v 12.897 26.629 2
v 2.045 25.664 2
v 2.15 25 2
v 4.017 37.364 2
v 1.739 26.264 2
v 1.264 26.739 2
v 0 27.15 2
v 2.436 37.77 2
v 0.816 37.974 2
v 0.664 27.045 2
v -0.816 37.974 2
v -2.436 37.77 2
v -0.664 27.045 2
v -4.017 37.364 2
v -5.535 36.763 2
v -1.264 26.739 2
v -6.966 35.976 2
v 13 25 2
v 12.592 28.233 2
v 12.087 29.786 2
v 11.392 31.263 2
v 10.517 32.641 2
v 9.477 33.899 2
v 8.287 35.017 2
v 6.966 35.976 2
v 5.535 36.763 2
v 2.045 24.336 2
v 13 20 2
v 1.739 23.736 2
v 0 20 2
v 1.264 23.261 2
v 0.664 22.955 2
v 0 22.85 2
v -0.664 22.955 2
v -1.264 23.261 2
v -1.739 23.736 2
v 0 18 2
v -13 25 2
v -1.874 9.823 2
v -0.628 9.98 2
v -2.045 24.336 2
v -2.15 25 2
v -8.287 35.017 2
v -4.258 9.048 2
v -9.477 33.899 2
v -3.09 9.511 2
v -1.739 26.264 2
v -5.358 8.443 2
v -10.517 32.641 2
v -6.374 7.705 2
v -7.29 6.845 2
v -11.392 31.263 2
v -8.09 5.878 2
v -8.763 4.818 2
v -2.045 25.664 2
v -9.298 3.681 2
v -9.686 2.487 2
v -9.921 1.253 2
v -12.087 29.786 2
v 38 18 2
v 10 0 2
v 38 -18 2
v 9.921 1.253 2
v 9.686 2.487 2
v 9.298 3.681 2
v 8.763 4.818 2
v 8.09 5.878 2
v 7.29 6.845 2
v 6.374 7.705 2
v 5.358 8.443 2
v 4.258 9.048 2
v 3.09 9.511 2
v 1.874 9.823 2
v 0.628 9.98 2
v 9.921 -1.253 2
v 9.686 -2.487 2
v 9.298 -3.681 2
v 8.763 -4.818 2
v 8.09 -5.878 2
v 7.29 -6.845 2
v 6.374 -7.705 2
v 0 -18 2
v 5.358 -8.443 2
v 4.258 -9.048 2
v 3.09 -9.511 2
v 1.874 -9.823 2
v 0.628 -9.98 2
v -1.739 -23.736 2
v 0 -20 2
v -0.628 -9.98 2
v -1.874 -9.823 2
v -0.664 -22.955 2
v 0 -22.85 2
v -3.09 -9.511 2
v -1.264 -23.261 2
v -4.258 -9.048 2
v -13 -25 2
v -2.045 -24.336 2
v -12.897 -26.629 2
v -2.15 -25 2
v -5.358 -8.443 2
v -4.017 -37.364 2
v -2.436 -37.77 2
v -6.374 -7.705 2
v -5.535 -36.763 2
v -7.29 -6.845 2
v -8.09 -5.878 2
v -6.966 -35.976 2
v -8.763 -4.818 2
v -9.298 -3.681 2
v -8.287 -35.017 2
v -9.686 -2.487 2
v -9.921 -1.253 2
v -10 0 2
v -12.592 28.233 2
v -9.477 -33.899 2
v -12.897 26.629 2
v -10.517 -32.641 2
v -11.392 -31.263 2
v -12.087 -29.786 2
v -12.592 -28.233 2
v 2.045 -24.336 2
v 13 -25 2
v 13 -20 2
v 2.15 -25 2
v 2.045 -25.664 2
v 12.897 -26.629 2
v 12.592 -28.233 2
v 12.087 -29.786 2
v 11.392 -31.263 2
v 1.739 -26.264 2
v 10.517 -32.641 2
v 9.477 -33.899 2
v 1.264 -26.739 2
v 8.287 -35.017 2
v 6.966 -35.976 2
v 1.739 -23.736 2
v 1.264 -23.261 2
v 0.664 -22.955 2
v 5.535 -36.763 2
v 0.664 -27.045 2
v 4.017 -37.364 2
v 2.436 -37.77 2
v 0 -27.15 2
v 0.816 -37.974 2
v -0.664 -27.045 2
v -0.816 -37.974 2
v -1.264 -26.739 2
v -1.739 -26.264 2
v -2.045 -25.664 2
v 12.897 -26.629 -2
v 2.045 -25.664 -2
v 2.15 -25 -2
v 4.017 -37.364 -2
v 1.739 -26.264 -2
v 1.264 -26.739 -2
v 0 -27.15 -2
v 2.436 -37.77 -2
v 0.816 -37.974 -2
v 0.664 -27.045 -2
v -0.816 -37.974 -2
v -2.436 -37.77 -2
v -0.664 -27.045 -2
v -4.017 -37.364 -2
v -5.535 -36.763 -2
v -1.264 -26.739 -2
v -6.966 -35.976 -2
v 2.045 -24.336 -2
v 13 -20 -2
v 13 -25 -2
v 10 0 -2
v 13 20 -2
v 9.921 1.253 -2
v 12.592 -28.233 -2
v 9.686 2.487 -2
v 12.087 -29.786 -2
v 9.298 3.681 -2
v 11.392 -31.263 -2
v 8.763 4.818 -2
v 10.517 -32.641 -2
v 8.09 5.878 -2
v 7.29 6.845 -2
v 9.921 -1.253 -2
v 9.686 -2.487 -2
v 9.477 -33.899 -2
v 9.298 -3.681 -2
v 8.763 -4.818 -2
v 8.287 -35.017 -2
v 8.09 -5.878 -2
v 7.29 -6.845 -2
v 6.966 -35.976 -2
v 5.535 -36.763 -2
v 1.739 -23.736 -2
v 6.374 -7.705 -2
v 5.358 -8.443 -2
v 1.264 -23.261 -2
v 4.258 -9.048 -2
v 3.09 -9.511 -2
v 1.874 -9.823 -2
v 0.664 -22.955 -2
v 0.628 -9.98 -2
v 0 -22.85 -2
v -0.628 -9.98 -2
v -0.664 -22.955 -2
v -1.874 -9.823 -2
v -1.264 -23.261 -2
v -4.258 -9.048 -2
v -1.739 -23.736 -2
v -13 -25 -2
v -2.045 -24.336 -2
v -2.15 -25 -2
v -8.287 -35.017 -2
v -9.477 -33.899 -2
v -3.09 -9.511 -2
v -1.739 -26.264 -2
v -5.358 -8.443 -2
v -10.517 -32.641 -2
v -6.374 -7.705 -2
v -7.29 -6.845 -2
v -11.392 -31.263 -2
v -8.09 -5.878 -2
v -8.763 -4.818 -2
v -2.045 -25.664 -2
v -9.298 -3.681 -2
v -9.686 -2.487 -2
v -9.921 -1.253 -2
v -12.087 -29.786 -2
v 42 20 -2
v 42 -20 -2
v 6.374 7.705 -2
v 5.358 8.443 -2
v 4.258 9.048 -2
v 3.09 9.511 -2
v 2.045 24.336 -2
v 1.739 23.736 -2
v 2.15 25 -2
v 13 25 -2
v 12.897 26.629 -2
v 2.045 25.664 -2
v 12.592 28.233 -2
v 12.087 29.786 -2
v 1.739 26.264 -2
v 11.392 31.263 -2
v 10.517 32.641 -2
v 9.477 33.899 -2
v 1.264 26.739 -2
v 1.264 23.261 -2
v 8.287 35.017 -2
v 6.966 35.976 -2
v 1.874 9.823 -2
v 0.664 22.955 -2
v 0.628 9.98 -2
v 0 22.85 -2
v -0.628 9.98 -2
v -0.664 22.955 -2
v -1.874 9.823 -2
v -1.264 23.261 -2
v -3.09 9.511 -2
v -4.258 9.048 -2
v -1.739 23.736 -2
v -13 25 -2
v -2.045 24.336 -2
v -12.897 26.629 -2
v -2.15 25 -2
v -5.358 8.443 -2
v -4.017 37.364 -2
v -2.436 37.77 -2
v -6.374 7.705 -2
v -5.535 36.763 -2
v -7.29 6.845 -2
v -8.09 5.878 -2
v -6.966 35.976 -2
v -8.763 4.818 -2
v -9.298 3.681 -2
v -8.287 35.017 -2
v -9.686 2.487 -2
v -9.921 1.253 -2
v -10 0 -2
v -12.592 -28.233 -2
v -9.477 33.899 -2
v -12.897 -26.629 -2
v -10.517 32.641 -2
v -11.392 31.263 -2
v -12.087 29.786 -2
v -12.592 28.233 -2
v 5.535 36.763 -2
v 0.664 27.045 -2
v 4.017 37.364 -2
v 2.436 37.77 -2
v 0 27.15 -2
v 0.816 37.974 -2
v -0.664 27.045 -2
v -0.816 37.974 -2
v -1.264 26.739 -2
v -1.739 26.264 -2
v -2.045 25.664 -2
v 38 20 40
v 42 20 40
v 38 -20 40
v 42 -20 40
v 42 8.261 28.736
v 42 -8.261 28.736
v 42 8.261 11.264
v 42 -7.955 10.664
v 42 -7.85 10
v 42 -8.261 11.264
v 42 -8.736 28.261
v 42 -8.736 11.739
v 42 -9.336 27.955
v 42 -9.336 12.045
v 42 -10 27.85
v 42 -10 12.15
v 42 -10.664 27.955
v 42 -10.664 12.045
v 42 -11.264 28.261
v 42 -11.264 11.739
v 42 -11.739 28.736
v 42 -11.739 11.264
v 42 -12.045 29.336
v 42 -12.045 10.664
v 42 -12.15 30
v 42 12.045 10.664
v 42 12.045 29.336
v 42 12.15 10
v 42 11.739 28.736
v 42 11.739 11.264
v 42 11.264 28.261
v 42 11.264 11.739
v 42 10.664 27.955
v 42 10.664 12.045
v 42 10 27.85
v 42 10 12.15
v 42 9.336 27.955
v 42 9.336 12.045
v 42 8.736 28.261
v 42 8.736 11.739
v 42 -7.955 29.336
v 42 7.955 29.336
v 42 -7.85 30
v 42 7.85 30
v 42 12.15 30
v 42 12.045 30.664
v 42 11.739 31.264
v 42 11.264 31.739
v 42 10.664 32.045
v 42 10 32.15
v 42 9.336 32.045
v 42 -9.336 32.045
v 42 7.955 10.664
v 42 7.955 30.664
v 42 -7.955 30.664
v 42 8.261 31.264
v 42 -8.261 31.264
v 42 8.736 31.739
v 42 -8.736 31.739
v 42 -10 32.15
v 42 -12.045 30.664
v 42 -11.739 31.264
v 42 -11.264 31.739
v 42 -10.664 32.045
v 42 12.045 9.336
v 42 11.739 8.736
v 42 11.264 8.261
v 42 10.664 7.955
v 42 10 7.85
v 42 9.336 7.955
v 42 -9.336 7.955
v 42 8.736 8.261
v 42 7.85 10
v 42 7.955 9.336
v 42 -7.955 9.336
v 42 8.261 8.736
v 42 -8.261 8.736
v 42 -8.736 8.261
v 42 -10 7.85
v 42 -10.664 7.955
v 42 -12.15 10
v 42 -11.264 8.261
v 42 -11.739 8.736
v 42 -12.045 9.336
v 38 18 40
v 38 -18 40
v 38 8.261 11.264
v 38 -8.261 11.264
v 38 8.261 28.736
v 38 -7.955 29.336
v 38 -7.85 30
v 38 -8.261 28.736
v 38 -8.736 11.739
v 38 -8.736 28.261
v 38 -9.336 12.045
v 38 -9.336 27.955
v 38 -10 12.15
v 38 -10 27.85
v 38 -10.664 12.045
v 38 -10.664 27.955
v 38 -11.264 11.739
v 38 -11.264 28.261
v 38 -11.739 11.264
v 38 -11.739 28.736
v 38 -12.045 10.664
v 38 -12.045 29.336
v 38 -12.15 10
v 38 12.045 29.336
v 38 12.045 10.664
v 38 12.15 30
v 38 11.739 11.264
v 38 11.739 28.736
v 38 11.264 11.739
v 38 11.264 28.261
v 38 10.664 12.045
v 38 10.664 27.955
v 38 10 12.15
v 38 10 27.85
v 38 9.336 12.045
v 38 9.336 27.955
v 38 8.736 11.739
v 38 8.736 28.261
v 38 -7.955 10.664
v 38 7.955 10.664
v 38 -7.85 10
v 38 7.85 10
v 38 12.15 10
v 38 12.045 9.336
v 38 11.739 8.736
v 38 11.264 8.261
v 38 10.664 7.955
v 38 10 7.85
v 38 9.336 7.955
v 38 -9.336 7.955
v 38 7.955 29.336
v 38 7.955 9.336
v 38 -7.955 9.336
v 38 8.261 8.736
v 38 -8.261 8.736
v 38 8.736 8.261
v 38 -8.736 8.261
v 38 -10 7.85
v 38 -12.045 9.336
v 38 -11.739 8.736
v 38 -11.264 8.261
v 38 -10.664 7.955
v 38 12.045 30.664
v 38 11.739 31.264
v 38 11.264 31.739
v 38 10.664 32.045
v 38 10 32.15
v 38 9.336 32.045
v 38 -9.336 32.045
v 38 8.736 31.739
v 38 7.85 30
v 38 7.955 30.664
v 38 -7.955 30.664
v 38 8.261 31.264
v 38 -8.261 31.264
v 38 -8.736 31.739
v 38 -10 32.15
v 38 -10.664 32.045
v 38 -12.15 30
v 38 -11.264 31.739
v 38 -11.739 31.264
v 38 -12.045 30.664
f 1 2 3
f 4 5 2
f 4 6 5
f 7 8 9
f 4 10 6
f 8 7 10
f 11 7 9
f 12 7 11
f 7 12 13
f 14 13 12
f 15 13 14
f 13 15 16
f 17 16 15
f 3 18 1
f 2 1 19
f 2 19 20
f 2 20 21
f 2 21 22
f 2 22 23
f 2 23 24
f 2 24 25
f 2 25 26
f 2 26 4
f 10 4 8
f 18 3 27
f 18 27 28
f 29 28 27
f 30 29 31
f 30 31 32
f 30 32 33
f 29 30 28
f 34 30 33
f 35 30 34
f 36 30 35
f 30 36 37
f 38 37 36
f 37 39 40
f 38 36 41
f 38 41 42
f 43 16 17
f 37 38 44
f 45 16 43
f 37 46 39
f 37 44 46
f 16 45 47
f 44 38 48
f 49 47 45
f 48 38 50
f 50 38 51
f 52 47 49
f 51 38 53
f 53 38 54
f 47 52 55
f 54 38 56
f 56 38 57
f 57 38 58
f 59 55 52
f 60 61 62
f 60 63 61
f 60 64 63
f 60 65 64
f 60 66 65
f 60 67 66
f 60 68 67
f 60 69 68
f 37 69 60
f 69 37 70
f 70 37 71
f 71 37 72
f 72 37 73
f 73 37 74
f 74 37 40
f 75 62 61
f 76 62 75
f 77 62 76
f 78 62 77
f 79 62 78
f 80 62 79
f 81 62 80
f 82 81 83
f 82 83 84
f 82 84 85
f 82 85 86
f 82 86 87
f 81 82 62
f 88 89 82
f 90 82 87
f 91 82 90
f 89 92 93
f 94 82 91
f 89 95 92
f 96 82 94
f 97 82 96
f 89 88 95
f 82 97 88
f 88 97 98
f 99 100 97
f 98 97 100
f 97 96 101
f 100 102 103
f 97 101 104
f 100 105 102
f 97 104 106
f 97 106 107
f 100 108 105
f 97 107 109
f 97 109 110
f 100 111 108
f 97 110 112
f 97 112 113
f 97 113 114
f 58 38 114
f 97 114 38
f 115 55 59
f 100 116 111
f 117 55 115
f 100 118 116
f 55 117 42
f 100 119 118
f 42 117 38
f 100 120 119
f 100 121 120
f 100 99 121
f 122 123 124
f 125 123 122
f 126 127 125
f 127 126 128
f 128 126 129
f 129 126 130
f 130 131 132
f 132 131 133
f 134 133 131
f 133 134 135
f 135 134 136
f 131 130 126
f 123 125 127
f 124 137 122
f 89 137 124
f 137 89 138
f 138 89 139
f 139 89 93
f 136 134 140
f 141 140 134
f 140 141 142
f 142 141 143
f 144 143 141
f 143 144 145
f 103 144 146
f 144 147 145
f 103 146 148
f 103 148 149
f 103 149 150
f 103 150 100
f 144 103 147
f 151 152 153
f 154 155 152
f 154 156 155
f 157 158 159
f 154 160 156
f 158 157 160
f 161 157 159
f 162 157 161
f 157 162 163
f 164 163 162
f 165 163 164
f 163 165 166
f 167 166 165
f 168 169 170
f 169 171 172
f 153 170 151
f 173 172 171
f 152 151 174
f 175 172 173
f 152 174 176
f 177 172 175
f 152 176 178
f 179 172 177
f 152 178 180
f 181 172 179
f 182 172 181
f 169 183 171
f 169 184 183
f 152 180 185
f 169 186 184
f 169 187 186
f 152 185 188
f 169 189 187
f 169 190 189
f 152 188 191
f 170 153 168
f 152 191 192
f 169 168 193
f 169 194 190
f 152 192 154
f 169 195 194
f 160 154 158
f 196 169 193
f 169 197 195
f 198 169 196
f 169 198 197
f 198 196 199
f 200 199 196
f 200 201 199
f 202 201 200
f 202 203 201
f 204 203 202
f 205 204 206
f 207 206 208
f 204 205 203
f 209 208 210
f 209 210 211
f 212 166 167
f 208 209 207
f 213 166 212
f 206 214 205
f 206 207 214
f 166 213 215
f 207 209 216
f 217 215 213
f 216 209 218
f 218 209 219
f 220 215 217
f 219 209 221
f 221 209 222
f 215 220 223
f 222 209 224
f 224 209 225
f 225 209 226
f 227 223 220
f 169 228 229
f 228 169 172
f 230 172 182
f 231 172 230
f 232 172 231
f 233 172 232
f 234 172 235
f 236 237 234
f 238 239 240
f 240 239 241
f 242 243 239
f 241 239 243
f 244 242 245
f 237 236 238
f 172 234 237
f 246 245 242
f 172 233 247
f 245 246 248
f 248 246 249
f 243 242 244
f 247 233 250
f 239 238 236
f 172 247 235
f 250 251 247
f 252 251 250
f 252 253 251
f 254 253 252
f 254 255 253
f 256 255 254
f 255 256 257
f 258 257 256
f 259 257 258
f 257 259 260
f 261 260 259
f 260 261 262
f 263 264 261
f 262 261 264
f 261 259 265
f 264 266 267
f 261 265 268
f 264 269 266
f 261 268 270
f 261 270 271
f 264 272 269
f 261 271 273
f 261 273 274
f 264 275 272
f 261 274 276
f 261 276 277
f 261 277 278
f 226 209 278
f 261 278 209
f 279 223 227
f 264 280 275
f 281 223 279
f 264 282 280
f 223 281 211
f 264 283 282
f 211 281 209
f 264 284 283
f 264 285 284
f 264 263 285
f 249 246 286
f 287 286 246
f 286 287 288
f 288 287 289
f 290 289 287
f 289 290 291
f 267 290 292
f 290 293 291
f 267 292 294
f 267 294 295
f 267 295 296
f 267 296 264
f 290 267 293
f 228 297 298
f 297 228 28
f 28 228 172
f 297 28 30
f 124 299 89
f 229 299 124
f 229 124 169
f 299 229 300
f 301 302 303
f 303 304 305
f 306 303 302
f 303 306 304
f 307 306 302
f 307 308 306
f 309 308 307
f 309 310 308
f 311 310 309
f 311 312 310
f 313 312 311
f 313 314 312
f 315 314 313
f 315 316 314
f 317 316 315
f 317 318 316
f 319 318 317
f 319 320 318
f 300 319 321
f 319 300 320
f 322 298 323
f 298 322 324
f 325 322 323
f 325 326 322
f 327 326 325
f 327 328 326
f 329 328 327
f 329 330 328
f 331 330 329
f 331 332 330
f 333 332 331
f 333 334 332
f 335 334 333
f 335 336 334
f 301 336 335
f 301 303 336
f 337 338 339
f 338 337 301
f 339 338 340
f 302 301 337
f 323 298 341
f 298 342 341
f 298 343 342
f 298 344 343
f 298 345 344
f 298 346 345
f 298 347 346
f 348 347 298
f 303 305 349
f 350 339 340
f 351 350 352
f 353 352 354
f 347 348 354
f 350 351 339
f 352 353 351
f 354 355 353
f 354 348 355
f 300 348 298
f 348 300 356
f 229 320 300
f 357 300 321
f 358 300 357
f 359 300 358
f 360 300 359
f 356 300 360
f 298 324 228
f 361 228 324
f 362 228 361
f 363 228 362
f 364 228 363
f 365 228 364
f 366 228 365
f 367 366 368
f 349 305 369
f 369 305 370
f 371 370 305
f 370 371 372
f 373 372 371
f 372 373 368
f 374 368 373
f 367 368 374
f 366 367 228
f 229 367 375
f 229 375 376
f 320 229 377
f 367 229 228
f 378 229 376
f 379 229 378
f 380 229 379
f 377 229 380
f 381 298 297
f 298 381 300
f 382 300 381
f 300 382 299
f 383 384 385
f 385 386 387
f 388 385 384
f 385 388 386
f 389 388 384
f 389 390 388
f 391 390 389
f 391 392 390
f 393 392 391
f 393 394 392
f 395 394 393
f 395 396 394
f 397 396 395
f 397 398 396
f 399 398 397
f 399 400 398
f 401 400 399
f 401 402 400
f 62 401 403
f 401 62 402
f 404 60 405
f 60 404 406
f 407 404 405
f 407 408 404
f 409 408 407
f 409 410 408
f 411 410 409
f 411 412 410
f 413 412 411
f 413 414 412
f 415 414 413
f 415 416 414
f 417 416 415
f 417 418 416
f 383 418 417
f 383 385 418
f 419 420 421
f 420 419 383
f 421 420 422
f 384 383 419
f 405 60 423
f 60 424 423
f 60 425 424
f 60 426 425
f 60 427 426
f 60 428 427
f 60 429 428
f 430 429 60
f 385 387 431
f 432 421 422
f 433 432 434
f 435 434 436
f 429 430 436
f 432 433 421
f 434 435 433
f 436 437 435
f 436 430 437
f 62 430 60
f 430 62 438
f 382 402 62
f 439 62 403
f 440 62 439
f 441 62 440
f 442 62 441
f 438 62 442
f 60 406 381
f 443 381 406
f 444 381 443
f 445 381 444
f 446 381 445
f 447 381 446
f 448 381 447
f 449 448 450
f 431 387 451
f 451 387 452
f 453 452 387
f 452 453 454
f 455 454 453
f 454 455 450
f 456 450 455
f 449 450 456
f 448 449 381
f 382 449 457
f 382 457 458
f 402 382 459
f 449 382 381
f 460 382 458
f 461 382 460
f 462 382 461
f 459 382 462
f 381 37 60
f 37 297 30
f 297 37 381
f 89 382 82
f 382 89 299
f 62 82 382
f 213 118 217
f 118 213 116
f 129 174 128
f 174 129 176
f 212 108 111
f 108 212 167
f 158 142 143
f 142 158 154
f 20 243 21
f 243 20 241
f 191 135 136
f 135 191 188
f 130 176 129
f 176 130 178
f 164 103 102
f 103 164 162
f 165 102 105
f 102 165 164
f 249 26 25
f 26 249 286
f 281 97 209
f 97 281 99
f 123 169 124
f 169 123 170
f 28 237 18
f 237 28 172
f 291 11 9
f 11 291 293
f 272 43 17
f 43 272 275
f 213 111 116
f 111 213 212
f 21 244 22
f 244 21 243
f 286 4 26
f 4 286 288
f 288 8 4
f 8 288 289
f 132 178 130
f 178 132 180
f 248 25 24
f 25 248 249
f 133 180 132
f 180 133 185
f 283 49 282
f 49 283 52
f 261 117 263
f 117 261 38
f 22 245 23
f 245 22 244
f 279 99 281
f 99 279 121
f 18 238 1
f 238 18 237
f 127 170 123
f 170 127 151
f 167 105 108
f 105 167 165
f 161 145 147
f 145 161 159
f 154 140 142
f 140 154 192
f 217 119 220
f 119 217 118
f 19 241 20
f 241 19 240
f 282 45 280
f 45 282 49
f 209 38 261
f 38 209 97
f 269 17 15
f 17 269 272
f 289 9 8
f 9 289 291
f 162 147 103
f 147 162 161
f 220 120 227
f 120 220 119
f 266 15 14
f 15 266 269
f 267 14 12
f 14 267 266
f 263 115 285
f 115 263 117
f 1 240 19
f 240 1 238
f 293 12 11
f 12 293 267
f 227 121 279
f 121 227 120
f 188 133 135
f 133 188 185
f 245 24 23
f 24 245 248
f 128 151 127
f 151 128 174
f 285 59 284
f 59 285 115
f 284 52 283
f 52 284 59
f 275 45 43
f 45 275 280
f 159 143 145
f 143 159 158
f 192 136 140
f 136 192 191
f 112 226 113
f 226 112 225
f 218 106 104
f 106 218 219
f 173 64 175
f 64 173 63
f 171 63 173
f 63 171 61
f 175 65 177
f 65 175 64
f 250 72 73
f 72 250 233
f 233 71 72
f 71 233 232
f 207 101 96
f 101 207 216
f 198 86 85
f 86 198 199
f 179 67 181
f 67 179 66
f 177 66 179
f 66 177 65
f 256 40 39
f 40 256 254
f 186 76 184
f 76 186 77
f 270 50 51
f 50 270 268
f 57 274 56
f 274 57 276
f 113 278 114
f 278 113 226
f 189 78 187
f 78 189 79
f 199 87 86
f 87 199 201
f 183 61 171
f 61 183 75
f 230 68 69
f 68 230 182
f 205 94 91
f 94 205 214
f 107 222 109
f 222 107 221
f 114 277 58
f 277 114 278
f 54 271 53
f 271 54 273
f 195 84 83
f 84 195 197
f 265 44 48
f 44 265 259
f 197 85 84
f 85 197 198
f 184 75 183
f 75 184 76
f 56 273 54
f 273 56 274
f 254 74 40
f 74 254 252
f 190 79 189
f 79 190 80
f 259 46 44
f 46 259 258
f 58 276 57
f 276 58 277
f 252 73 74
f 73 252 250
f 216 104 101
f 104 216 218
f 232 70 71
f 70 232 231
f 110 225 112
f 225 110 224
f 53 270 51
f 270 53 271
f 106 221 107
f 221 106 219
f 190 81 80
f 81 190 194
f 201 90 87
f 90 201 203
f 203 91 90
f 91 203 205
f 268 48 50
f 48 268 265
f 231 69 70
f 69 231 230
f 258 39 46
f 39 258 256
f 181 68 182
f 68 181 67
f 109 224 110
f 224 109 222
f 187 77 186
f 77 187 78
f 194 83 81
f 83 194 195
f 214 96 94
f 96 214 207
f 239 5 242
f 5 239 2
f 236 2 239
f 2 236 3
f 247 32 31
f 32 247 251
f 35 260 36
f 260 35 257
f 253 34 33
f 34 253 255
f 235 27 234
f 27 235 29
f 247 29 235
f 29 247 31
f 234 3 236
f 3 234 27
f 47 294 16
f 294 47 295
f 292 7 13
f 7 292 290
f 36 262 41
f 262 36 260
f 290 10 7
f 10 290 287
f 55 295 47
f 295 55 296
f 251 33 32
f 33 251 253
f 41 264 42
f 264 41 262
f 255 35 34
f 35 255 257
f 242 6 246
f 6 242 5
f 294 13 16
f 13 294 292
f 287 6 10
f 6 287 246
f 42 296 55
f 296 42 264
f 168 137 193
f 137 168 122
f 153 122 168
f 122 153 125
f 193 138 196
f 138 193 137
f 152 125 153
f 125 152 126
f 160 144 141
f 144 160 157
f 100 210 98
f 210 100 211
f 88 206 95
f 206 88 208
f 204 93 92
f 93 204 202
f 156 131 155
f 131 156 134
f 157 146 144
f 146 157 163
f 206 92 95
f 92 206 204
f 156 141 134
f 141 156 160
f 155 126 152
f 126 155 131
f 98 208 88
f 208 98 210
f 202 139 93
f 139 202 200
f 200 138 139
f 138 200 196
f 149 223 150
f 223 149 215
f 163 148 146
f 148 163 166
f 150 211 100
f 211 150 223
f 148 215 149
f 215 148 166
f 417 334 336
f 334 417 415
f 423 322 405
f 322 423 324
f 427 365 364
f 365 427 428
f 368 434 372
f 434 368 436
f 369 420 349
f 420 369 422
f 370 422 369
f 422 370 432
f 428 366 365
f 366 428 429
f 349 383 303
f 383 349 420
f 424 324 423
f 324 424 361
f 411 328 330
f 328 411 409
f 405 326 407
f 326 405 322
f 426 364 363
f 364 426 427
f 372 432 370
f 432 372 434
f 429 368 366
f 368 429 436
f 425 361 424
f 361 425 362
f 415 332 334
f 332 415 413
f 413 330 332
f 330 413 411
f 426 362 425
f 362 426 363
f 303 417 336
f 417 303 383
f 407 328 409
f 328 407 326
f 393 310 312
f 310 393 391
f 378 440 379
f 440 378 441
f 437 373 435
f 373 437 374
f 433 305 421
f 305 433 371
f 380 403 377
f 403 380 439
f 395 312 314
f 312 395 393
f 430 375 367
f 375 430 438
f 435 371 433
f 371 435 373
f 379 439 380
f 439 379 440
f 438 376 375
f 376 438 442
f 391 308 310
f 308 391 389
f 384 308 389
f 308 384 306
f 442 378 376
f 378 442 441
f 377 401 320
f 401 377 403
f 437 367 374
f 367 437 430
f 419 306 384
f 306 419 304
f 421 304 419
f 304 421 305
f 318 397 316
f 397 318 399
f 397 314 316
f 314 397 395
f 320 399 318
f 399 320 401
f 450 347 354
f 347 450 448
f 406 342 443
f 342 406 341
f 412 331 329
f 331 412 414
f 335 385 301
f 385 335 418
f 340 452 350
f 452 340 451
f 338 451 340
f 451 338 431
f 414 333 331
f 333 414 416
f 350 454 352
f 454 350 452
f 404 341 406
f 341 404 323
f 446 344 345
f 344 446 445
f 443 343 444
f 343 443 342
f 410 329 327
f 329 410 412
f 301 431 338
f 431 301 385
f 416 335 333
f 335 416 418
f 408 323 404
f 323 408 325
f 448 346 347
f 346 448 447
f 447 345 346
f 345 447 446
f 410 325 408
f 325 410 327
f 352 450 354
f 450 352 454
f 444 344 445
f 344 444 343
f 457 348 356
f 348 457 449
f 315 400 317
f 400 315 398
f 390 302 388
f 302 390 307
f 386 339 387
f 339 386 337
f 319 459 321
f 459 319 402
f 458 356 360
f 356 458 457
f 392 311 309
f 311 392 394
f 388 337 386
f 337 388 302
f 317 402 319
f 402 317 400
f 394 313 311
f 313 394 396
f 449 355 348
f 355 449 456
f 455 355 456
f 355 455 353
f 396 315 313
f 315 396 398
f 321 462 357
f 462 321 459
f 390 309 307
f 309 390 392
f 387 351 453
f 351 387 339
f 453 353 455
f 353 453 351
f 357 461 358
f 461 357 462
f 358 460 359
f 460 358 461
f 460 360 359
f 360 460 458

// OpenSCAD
// file: configuration.scad
// OD = outside diameter, corner to corner.
m3_nut_od = 6.1;
m3_nut_radius = (m3_nut_od+0.2)/2;

m4_nut_od = 8.1;
m4_nut_radius = (m4_nut_od+0.2)/2;

// Major diameter of metric 3mm thread.
m3_major = 2.85;
m3_radius = m3_major/2;
m3_open_radius = 3.2/2;

m4_major = 3.85;
m4_radius = m4_major/2;
m4_open_radius = 4.3/2;

m5_major = 4.85;
m5_radius = m5_major/2;
m5_open_radius = 5.3/2;

m8_major = 7.85;
m8_radius = m8_major/2;
m8_open_radius = 8.3/2;

// NEMA17 stepper motors.
motor_shaft_diameter = 5;
motor_shaft_radius = (motor_shaft_diameter+0.3)/2;

// Frame brackets.
thickness = 3.6;

tower_radius = 185;
tower_side = tower_radius*1.73205;
tower_h = tower_radius*1.5;
tower_height = 1000;
bearing_spacing = 39.8;
horizontal_beam_radius = (tower_radius+28.8)/2;
horizontal_beam_length = horizontal_beam_radius * 3.464101615138 - (41.35*2);

color_a = "GreenYellow";
color_b = "black";
color_c = "";
color_d = "Silver";
// main file
include <configuration.scad>;

difference(){
	body();
	cutouts();
}

module body(){
	translate([20,0,0])cube([40,40,4],center=true);

	translate([40,0,19])cube([4,40,42],center=true);

	hull(){
		translate([20,19,0])cube([40,2,4],center=true);
		translate([40,19,20])cube([4,2,40],center=true);
	}
	hull(){
		translate([20,-19,0])cube([40,2,4],center=true);
		translate([40,-19,20])cube([4,2,40],center=true);
	}

	hull(){
		translate([0,25,0]) cylinder(r=13,h=4,center=true,$fn=50);
		translate([0,-25,0]) cylinder(r=13,h=4,center=true,$fn=50);
	}
}

module cutouts(){
	translate([0,0,0]) cylinder(r=10,h=20,center=true,$fn=50);

	translate([0,25,0]) cylinder(r=m4_open_radius,h=20,center=true,$fn=20);
	translate([0,-25,0]) cylinder(r=m4_open_radius,h=20,center=true,$fn=20);

	translate([40,10,10]) rotate([0,90,0]) cylinder(r=m4_open_radius,h=20,center=true,$fn=20);
	translate([40,-10,10]) rotate([0,90,0]) cylinder(r=m4_open_radius,h=20,center=true,$fn=20);
	translate([40,10,30]) rotate([0,90,0]) cylinder(r=m4_open_radius,h=20,center=true,$fn=20);
	translate([40,-10,30]) rotate([0,90,0]) cylinder(r=m4_open_radius,h=20,center=true,$fn=20);
}
